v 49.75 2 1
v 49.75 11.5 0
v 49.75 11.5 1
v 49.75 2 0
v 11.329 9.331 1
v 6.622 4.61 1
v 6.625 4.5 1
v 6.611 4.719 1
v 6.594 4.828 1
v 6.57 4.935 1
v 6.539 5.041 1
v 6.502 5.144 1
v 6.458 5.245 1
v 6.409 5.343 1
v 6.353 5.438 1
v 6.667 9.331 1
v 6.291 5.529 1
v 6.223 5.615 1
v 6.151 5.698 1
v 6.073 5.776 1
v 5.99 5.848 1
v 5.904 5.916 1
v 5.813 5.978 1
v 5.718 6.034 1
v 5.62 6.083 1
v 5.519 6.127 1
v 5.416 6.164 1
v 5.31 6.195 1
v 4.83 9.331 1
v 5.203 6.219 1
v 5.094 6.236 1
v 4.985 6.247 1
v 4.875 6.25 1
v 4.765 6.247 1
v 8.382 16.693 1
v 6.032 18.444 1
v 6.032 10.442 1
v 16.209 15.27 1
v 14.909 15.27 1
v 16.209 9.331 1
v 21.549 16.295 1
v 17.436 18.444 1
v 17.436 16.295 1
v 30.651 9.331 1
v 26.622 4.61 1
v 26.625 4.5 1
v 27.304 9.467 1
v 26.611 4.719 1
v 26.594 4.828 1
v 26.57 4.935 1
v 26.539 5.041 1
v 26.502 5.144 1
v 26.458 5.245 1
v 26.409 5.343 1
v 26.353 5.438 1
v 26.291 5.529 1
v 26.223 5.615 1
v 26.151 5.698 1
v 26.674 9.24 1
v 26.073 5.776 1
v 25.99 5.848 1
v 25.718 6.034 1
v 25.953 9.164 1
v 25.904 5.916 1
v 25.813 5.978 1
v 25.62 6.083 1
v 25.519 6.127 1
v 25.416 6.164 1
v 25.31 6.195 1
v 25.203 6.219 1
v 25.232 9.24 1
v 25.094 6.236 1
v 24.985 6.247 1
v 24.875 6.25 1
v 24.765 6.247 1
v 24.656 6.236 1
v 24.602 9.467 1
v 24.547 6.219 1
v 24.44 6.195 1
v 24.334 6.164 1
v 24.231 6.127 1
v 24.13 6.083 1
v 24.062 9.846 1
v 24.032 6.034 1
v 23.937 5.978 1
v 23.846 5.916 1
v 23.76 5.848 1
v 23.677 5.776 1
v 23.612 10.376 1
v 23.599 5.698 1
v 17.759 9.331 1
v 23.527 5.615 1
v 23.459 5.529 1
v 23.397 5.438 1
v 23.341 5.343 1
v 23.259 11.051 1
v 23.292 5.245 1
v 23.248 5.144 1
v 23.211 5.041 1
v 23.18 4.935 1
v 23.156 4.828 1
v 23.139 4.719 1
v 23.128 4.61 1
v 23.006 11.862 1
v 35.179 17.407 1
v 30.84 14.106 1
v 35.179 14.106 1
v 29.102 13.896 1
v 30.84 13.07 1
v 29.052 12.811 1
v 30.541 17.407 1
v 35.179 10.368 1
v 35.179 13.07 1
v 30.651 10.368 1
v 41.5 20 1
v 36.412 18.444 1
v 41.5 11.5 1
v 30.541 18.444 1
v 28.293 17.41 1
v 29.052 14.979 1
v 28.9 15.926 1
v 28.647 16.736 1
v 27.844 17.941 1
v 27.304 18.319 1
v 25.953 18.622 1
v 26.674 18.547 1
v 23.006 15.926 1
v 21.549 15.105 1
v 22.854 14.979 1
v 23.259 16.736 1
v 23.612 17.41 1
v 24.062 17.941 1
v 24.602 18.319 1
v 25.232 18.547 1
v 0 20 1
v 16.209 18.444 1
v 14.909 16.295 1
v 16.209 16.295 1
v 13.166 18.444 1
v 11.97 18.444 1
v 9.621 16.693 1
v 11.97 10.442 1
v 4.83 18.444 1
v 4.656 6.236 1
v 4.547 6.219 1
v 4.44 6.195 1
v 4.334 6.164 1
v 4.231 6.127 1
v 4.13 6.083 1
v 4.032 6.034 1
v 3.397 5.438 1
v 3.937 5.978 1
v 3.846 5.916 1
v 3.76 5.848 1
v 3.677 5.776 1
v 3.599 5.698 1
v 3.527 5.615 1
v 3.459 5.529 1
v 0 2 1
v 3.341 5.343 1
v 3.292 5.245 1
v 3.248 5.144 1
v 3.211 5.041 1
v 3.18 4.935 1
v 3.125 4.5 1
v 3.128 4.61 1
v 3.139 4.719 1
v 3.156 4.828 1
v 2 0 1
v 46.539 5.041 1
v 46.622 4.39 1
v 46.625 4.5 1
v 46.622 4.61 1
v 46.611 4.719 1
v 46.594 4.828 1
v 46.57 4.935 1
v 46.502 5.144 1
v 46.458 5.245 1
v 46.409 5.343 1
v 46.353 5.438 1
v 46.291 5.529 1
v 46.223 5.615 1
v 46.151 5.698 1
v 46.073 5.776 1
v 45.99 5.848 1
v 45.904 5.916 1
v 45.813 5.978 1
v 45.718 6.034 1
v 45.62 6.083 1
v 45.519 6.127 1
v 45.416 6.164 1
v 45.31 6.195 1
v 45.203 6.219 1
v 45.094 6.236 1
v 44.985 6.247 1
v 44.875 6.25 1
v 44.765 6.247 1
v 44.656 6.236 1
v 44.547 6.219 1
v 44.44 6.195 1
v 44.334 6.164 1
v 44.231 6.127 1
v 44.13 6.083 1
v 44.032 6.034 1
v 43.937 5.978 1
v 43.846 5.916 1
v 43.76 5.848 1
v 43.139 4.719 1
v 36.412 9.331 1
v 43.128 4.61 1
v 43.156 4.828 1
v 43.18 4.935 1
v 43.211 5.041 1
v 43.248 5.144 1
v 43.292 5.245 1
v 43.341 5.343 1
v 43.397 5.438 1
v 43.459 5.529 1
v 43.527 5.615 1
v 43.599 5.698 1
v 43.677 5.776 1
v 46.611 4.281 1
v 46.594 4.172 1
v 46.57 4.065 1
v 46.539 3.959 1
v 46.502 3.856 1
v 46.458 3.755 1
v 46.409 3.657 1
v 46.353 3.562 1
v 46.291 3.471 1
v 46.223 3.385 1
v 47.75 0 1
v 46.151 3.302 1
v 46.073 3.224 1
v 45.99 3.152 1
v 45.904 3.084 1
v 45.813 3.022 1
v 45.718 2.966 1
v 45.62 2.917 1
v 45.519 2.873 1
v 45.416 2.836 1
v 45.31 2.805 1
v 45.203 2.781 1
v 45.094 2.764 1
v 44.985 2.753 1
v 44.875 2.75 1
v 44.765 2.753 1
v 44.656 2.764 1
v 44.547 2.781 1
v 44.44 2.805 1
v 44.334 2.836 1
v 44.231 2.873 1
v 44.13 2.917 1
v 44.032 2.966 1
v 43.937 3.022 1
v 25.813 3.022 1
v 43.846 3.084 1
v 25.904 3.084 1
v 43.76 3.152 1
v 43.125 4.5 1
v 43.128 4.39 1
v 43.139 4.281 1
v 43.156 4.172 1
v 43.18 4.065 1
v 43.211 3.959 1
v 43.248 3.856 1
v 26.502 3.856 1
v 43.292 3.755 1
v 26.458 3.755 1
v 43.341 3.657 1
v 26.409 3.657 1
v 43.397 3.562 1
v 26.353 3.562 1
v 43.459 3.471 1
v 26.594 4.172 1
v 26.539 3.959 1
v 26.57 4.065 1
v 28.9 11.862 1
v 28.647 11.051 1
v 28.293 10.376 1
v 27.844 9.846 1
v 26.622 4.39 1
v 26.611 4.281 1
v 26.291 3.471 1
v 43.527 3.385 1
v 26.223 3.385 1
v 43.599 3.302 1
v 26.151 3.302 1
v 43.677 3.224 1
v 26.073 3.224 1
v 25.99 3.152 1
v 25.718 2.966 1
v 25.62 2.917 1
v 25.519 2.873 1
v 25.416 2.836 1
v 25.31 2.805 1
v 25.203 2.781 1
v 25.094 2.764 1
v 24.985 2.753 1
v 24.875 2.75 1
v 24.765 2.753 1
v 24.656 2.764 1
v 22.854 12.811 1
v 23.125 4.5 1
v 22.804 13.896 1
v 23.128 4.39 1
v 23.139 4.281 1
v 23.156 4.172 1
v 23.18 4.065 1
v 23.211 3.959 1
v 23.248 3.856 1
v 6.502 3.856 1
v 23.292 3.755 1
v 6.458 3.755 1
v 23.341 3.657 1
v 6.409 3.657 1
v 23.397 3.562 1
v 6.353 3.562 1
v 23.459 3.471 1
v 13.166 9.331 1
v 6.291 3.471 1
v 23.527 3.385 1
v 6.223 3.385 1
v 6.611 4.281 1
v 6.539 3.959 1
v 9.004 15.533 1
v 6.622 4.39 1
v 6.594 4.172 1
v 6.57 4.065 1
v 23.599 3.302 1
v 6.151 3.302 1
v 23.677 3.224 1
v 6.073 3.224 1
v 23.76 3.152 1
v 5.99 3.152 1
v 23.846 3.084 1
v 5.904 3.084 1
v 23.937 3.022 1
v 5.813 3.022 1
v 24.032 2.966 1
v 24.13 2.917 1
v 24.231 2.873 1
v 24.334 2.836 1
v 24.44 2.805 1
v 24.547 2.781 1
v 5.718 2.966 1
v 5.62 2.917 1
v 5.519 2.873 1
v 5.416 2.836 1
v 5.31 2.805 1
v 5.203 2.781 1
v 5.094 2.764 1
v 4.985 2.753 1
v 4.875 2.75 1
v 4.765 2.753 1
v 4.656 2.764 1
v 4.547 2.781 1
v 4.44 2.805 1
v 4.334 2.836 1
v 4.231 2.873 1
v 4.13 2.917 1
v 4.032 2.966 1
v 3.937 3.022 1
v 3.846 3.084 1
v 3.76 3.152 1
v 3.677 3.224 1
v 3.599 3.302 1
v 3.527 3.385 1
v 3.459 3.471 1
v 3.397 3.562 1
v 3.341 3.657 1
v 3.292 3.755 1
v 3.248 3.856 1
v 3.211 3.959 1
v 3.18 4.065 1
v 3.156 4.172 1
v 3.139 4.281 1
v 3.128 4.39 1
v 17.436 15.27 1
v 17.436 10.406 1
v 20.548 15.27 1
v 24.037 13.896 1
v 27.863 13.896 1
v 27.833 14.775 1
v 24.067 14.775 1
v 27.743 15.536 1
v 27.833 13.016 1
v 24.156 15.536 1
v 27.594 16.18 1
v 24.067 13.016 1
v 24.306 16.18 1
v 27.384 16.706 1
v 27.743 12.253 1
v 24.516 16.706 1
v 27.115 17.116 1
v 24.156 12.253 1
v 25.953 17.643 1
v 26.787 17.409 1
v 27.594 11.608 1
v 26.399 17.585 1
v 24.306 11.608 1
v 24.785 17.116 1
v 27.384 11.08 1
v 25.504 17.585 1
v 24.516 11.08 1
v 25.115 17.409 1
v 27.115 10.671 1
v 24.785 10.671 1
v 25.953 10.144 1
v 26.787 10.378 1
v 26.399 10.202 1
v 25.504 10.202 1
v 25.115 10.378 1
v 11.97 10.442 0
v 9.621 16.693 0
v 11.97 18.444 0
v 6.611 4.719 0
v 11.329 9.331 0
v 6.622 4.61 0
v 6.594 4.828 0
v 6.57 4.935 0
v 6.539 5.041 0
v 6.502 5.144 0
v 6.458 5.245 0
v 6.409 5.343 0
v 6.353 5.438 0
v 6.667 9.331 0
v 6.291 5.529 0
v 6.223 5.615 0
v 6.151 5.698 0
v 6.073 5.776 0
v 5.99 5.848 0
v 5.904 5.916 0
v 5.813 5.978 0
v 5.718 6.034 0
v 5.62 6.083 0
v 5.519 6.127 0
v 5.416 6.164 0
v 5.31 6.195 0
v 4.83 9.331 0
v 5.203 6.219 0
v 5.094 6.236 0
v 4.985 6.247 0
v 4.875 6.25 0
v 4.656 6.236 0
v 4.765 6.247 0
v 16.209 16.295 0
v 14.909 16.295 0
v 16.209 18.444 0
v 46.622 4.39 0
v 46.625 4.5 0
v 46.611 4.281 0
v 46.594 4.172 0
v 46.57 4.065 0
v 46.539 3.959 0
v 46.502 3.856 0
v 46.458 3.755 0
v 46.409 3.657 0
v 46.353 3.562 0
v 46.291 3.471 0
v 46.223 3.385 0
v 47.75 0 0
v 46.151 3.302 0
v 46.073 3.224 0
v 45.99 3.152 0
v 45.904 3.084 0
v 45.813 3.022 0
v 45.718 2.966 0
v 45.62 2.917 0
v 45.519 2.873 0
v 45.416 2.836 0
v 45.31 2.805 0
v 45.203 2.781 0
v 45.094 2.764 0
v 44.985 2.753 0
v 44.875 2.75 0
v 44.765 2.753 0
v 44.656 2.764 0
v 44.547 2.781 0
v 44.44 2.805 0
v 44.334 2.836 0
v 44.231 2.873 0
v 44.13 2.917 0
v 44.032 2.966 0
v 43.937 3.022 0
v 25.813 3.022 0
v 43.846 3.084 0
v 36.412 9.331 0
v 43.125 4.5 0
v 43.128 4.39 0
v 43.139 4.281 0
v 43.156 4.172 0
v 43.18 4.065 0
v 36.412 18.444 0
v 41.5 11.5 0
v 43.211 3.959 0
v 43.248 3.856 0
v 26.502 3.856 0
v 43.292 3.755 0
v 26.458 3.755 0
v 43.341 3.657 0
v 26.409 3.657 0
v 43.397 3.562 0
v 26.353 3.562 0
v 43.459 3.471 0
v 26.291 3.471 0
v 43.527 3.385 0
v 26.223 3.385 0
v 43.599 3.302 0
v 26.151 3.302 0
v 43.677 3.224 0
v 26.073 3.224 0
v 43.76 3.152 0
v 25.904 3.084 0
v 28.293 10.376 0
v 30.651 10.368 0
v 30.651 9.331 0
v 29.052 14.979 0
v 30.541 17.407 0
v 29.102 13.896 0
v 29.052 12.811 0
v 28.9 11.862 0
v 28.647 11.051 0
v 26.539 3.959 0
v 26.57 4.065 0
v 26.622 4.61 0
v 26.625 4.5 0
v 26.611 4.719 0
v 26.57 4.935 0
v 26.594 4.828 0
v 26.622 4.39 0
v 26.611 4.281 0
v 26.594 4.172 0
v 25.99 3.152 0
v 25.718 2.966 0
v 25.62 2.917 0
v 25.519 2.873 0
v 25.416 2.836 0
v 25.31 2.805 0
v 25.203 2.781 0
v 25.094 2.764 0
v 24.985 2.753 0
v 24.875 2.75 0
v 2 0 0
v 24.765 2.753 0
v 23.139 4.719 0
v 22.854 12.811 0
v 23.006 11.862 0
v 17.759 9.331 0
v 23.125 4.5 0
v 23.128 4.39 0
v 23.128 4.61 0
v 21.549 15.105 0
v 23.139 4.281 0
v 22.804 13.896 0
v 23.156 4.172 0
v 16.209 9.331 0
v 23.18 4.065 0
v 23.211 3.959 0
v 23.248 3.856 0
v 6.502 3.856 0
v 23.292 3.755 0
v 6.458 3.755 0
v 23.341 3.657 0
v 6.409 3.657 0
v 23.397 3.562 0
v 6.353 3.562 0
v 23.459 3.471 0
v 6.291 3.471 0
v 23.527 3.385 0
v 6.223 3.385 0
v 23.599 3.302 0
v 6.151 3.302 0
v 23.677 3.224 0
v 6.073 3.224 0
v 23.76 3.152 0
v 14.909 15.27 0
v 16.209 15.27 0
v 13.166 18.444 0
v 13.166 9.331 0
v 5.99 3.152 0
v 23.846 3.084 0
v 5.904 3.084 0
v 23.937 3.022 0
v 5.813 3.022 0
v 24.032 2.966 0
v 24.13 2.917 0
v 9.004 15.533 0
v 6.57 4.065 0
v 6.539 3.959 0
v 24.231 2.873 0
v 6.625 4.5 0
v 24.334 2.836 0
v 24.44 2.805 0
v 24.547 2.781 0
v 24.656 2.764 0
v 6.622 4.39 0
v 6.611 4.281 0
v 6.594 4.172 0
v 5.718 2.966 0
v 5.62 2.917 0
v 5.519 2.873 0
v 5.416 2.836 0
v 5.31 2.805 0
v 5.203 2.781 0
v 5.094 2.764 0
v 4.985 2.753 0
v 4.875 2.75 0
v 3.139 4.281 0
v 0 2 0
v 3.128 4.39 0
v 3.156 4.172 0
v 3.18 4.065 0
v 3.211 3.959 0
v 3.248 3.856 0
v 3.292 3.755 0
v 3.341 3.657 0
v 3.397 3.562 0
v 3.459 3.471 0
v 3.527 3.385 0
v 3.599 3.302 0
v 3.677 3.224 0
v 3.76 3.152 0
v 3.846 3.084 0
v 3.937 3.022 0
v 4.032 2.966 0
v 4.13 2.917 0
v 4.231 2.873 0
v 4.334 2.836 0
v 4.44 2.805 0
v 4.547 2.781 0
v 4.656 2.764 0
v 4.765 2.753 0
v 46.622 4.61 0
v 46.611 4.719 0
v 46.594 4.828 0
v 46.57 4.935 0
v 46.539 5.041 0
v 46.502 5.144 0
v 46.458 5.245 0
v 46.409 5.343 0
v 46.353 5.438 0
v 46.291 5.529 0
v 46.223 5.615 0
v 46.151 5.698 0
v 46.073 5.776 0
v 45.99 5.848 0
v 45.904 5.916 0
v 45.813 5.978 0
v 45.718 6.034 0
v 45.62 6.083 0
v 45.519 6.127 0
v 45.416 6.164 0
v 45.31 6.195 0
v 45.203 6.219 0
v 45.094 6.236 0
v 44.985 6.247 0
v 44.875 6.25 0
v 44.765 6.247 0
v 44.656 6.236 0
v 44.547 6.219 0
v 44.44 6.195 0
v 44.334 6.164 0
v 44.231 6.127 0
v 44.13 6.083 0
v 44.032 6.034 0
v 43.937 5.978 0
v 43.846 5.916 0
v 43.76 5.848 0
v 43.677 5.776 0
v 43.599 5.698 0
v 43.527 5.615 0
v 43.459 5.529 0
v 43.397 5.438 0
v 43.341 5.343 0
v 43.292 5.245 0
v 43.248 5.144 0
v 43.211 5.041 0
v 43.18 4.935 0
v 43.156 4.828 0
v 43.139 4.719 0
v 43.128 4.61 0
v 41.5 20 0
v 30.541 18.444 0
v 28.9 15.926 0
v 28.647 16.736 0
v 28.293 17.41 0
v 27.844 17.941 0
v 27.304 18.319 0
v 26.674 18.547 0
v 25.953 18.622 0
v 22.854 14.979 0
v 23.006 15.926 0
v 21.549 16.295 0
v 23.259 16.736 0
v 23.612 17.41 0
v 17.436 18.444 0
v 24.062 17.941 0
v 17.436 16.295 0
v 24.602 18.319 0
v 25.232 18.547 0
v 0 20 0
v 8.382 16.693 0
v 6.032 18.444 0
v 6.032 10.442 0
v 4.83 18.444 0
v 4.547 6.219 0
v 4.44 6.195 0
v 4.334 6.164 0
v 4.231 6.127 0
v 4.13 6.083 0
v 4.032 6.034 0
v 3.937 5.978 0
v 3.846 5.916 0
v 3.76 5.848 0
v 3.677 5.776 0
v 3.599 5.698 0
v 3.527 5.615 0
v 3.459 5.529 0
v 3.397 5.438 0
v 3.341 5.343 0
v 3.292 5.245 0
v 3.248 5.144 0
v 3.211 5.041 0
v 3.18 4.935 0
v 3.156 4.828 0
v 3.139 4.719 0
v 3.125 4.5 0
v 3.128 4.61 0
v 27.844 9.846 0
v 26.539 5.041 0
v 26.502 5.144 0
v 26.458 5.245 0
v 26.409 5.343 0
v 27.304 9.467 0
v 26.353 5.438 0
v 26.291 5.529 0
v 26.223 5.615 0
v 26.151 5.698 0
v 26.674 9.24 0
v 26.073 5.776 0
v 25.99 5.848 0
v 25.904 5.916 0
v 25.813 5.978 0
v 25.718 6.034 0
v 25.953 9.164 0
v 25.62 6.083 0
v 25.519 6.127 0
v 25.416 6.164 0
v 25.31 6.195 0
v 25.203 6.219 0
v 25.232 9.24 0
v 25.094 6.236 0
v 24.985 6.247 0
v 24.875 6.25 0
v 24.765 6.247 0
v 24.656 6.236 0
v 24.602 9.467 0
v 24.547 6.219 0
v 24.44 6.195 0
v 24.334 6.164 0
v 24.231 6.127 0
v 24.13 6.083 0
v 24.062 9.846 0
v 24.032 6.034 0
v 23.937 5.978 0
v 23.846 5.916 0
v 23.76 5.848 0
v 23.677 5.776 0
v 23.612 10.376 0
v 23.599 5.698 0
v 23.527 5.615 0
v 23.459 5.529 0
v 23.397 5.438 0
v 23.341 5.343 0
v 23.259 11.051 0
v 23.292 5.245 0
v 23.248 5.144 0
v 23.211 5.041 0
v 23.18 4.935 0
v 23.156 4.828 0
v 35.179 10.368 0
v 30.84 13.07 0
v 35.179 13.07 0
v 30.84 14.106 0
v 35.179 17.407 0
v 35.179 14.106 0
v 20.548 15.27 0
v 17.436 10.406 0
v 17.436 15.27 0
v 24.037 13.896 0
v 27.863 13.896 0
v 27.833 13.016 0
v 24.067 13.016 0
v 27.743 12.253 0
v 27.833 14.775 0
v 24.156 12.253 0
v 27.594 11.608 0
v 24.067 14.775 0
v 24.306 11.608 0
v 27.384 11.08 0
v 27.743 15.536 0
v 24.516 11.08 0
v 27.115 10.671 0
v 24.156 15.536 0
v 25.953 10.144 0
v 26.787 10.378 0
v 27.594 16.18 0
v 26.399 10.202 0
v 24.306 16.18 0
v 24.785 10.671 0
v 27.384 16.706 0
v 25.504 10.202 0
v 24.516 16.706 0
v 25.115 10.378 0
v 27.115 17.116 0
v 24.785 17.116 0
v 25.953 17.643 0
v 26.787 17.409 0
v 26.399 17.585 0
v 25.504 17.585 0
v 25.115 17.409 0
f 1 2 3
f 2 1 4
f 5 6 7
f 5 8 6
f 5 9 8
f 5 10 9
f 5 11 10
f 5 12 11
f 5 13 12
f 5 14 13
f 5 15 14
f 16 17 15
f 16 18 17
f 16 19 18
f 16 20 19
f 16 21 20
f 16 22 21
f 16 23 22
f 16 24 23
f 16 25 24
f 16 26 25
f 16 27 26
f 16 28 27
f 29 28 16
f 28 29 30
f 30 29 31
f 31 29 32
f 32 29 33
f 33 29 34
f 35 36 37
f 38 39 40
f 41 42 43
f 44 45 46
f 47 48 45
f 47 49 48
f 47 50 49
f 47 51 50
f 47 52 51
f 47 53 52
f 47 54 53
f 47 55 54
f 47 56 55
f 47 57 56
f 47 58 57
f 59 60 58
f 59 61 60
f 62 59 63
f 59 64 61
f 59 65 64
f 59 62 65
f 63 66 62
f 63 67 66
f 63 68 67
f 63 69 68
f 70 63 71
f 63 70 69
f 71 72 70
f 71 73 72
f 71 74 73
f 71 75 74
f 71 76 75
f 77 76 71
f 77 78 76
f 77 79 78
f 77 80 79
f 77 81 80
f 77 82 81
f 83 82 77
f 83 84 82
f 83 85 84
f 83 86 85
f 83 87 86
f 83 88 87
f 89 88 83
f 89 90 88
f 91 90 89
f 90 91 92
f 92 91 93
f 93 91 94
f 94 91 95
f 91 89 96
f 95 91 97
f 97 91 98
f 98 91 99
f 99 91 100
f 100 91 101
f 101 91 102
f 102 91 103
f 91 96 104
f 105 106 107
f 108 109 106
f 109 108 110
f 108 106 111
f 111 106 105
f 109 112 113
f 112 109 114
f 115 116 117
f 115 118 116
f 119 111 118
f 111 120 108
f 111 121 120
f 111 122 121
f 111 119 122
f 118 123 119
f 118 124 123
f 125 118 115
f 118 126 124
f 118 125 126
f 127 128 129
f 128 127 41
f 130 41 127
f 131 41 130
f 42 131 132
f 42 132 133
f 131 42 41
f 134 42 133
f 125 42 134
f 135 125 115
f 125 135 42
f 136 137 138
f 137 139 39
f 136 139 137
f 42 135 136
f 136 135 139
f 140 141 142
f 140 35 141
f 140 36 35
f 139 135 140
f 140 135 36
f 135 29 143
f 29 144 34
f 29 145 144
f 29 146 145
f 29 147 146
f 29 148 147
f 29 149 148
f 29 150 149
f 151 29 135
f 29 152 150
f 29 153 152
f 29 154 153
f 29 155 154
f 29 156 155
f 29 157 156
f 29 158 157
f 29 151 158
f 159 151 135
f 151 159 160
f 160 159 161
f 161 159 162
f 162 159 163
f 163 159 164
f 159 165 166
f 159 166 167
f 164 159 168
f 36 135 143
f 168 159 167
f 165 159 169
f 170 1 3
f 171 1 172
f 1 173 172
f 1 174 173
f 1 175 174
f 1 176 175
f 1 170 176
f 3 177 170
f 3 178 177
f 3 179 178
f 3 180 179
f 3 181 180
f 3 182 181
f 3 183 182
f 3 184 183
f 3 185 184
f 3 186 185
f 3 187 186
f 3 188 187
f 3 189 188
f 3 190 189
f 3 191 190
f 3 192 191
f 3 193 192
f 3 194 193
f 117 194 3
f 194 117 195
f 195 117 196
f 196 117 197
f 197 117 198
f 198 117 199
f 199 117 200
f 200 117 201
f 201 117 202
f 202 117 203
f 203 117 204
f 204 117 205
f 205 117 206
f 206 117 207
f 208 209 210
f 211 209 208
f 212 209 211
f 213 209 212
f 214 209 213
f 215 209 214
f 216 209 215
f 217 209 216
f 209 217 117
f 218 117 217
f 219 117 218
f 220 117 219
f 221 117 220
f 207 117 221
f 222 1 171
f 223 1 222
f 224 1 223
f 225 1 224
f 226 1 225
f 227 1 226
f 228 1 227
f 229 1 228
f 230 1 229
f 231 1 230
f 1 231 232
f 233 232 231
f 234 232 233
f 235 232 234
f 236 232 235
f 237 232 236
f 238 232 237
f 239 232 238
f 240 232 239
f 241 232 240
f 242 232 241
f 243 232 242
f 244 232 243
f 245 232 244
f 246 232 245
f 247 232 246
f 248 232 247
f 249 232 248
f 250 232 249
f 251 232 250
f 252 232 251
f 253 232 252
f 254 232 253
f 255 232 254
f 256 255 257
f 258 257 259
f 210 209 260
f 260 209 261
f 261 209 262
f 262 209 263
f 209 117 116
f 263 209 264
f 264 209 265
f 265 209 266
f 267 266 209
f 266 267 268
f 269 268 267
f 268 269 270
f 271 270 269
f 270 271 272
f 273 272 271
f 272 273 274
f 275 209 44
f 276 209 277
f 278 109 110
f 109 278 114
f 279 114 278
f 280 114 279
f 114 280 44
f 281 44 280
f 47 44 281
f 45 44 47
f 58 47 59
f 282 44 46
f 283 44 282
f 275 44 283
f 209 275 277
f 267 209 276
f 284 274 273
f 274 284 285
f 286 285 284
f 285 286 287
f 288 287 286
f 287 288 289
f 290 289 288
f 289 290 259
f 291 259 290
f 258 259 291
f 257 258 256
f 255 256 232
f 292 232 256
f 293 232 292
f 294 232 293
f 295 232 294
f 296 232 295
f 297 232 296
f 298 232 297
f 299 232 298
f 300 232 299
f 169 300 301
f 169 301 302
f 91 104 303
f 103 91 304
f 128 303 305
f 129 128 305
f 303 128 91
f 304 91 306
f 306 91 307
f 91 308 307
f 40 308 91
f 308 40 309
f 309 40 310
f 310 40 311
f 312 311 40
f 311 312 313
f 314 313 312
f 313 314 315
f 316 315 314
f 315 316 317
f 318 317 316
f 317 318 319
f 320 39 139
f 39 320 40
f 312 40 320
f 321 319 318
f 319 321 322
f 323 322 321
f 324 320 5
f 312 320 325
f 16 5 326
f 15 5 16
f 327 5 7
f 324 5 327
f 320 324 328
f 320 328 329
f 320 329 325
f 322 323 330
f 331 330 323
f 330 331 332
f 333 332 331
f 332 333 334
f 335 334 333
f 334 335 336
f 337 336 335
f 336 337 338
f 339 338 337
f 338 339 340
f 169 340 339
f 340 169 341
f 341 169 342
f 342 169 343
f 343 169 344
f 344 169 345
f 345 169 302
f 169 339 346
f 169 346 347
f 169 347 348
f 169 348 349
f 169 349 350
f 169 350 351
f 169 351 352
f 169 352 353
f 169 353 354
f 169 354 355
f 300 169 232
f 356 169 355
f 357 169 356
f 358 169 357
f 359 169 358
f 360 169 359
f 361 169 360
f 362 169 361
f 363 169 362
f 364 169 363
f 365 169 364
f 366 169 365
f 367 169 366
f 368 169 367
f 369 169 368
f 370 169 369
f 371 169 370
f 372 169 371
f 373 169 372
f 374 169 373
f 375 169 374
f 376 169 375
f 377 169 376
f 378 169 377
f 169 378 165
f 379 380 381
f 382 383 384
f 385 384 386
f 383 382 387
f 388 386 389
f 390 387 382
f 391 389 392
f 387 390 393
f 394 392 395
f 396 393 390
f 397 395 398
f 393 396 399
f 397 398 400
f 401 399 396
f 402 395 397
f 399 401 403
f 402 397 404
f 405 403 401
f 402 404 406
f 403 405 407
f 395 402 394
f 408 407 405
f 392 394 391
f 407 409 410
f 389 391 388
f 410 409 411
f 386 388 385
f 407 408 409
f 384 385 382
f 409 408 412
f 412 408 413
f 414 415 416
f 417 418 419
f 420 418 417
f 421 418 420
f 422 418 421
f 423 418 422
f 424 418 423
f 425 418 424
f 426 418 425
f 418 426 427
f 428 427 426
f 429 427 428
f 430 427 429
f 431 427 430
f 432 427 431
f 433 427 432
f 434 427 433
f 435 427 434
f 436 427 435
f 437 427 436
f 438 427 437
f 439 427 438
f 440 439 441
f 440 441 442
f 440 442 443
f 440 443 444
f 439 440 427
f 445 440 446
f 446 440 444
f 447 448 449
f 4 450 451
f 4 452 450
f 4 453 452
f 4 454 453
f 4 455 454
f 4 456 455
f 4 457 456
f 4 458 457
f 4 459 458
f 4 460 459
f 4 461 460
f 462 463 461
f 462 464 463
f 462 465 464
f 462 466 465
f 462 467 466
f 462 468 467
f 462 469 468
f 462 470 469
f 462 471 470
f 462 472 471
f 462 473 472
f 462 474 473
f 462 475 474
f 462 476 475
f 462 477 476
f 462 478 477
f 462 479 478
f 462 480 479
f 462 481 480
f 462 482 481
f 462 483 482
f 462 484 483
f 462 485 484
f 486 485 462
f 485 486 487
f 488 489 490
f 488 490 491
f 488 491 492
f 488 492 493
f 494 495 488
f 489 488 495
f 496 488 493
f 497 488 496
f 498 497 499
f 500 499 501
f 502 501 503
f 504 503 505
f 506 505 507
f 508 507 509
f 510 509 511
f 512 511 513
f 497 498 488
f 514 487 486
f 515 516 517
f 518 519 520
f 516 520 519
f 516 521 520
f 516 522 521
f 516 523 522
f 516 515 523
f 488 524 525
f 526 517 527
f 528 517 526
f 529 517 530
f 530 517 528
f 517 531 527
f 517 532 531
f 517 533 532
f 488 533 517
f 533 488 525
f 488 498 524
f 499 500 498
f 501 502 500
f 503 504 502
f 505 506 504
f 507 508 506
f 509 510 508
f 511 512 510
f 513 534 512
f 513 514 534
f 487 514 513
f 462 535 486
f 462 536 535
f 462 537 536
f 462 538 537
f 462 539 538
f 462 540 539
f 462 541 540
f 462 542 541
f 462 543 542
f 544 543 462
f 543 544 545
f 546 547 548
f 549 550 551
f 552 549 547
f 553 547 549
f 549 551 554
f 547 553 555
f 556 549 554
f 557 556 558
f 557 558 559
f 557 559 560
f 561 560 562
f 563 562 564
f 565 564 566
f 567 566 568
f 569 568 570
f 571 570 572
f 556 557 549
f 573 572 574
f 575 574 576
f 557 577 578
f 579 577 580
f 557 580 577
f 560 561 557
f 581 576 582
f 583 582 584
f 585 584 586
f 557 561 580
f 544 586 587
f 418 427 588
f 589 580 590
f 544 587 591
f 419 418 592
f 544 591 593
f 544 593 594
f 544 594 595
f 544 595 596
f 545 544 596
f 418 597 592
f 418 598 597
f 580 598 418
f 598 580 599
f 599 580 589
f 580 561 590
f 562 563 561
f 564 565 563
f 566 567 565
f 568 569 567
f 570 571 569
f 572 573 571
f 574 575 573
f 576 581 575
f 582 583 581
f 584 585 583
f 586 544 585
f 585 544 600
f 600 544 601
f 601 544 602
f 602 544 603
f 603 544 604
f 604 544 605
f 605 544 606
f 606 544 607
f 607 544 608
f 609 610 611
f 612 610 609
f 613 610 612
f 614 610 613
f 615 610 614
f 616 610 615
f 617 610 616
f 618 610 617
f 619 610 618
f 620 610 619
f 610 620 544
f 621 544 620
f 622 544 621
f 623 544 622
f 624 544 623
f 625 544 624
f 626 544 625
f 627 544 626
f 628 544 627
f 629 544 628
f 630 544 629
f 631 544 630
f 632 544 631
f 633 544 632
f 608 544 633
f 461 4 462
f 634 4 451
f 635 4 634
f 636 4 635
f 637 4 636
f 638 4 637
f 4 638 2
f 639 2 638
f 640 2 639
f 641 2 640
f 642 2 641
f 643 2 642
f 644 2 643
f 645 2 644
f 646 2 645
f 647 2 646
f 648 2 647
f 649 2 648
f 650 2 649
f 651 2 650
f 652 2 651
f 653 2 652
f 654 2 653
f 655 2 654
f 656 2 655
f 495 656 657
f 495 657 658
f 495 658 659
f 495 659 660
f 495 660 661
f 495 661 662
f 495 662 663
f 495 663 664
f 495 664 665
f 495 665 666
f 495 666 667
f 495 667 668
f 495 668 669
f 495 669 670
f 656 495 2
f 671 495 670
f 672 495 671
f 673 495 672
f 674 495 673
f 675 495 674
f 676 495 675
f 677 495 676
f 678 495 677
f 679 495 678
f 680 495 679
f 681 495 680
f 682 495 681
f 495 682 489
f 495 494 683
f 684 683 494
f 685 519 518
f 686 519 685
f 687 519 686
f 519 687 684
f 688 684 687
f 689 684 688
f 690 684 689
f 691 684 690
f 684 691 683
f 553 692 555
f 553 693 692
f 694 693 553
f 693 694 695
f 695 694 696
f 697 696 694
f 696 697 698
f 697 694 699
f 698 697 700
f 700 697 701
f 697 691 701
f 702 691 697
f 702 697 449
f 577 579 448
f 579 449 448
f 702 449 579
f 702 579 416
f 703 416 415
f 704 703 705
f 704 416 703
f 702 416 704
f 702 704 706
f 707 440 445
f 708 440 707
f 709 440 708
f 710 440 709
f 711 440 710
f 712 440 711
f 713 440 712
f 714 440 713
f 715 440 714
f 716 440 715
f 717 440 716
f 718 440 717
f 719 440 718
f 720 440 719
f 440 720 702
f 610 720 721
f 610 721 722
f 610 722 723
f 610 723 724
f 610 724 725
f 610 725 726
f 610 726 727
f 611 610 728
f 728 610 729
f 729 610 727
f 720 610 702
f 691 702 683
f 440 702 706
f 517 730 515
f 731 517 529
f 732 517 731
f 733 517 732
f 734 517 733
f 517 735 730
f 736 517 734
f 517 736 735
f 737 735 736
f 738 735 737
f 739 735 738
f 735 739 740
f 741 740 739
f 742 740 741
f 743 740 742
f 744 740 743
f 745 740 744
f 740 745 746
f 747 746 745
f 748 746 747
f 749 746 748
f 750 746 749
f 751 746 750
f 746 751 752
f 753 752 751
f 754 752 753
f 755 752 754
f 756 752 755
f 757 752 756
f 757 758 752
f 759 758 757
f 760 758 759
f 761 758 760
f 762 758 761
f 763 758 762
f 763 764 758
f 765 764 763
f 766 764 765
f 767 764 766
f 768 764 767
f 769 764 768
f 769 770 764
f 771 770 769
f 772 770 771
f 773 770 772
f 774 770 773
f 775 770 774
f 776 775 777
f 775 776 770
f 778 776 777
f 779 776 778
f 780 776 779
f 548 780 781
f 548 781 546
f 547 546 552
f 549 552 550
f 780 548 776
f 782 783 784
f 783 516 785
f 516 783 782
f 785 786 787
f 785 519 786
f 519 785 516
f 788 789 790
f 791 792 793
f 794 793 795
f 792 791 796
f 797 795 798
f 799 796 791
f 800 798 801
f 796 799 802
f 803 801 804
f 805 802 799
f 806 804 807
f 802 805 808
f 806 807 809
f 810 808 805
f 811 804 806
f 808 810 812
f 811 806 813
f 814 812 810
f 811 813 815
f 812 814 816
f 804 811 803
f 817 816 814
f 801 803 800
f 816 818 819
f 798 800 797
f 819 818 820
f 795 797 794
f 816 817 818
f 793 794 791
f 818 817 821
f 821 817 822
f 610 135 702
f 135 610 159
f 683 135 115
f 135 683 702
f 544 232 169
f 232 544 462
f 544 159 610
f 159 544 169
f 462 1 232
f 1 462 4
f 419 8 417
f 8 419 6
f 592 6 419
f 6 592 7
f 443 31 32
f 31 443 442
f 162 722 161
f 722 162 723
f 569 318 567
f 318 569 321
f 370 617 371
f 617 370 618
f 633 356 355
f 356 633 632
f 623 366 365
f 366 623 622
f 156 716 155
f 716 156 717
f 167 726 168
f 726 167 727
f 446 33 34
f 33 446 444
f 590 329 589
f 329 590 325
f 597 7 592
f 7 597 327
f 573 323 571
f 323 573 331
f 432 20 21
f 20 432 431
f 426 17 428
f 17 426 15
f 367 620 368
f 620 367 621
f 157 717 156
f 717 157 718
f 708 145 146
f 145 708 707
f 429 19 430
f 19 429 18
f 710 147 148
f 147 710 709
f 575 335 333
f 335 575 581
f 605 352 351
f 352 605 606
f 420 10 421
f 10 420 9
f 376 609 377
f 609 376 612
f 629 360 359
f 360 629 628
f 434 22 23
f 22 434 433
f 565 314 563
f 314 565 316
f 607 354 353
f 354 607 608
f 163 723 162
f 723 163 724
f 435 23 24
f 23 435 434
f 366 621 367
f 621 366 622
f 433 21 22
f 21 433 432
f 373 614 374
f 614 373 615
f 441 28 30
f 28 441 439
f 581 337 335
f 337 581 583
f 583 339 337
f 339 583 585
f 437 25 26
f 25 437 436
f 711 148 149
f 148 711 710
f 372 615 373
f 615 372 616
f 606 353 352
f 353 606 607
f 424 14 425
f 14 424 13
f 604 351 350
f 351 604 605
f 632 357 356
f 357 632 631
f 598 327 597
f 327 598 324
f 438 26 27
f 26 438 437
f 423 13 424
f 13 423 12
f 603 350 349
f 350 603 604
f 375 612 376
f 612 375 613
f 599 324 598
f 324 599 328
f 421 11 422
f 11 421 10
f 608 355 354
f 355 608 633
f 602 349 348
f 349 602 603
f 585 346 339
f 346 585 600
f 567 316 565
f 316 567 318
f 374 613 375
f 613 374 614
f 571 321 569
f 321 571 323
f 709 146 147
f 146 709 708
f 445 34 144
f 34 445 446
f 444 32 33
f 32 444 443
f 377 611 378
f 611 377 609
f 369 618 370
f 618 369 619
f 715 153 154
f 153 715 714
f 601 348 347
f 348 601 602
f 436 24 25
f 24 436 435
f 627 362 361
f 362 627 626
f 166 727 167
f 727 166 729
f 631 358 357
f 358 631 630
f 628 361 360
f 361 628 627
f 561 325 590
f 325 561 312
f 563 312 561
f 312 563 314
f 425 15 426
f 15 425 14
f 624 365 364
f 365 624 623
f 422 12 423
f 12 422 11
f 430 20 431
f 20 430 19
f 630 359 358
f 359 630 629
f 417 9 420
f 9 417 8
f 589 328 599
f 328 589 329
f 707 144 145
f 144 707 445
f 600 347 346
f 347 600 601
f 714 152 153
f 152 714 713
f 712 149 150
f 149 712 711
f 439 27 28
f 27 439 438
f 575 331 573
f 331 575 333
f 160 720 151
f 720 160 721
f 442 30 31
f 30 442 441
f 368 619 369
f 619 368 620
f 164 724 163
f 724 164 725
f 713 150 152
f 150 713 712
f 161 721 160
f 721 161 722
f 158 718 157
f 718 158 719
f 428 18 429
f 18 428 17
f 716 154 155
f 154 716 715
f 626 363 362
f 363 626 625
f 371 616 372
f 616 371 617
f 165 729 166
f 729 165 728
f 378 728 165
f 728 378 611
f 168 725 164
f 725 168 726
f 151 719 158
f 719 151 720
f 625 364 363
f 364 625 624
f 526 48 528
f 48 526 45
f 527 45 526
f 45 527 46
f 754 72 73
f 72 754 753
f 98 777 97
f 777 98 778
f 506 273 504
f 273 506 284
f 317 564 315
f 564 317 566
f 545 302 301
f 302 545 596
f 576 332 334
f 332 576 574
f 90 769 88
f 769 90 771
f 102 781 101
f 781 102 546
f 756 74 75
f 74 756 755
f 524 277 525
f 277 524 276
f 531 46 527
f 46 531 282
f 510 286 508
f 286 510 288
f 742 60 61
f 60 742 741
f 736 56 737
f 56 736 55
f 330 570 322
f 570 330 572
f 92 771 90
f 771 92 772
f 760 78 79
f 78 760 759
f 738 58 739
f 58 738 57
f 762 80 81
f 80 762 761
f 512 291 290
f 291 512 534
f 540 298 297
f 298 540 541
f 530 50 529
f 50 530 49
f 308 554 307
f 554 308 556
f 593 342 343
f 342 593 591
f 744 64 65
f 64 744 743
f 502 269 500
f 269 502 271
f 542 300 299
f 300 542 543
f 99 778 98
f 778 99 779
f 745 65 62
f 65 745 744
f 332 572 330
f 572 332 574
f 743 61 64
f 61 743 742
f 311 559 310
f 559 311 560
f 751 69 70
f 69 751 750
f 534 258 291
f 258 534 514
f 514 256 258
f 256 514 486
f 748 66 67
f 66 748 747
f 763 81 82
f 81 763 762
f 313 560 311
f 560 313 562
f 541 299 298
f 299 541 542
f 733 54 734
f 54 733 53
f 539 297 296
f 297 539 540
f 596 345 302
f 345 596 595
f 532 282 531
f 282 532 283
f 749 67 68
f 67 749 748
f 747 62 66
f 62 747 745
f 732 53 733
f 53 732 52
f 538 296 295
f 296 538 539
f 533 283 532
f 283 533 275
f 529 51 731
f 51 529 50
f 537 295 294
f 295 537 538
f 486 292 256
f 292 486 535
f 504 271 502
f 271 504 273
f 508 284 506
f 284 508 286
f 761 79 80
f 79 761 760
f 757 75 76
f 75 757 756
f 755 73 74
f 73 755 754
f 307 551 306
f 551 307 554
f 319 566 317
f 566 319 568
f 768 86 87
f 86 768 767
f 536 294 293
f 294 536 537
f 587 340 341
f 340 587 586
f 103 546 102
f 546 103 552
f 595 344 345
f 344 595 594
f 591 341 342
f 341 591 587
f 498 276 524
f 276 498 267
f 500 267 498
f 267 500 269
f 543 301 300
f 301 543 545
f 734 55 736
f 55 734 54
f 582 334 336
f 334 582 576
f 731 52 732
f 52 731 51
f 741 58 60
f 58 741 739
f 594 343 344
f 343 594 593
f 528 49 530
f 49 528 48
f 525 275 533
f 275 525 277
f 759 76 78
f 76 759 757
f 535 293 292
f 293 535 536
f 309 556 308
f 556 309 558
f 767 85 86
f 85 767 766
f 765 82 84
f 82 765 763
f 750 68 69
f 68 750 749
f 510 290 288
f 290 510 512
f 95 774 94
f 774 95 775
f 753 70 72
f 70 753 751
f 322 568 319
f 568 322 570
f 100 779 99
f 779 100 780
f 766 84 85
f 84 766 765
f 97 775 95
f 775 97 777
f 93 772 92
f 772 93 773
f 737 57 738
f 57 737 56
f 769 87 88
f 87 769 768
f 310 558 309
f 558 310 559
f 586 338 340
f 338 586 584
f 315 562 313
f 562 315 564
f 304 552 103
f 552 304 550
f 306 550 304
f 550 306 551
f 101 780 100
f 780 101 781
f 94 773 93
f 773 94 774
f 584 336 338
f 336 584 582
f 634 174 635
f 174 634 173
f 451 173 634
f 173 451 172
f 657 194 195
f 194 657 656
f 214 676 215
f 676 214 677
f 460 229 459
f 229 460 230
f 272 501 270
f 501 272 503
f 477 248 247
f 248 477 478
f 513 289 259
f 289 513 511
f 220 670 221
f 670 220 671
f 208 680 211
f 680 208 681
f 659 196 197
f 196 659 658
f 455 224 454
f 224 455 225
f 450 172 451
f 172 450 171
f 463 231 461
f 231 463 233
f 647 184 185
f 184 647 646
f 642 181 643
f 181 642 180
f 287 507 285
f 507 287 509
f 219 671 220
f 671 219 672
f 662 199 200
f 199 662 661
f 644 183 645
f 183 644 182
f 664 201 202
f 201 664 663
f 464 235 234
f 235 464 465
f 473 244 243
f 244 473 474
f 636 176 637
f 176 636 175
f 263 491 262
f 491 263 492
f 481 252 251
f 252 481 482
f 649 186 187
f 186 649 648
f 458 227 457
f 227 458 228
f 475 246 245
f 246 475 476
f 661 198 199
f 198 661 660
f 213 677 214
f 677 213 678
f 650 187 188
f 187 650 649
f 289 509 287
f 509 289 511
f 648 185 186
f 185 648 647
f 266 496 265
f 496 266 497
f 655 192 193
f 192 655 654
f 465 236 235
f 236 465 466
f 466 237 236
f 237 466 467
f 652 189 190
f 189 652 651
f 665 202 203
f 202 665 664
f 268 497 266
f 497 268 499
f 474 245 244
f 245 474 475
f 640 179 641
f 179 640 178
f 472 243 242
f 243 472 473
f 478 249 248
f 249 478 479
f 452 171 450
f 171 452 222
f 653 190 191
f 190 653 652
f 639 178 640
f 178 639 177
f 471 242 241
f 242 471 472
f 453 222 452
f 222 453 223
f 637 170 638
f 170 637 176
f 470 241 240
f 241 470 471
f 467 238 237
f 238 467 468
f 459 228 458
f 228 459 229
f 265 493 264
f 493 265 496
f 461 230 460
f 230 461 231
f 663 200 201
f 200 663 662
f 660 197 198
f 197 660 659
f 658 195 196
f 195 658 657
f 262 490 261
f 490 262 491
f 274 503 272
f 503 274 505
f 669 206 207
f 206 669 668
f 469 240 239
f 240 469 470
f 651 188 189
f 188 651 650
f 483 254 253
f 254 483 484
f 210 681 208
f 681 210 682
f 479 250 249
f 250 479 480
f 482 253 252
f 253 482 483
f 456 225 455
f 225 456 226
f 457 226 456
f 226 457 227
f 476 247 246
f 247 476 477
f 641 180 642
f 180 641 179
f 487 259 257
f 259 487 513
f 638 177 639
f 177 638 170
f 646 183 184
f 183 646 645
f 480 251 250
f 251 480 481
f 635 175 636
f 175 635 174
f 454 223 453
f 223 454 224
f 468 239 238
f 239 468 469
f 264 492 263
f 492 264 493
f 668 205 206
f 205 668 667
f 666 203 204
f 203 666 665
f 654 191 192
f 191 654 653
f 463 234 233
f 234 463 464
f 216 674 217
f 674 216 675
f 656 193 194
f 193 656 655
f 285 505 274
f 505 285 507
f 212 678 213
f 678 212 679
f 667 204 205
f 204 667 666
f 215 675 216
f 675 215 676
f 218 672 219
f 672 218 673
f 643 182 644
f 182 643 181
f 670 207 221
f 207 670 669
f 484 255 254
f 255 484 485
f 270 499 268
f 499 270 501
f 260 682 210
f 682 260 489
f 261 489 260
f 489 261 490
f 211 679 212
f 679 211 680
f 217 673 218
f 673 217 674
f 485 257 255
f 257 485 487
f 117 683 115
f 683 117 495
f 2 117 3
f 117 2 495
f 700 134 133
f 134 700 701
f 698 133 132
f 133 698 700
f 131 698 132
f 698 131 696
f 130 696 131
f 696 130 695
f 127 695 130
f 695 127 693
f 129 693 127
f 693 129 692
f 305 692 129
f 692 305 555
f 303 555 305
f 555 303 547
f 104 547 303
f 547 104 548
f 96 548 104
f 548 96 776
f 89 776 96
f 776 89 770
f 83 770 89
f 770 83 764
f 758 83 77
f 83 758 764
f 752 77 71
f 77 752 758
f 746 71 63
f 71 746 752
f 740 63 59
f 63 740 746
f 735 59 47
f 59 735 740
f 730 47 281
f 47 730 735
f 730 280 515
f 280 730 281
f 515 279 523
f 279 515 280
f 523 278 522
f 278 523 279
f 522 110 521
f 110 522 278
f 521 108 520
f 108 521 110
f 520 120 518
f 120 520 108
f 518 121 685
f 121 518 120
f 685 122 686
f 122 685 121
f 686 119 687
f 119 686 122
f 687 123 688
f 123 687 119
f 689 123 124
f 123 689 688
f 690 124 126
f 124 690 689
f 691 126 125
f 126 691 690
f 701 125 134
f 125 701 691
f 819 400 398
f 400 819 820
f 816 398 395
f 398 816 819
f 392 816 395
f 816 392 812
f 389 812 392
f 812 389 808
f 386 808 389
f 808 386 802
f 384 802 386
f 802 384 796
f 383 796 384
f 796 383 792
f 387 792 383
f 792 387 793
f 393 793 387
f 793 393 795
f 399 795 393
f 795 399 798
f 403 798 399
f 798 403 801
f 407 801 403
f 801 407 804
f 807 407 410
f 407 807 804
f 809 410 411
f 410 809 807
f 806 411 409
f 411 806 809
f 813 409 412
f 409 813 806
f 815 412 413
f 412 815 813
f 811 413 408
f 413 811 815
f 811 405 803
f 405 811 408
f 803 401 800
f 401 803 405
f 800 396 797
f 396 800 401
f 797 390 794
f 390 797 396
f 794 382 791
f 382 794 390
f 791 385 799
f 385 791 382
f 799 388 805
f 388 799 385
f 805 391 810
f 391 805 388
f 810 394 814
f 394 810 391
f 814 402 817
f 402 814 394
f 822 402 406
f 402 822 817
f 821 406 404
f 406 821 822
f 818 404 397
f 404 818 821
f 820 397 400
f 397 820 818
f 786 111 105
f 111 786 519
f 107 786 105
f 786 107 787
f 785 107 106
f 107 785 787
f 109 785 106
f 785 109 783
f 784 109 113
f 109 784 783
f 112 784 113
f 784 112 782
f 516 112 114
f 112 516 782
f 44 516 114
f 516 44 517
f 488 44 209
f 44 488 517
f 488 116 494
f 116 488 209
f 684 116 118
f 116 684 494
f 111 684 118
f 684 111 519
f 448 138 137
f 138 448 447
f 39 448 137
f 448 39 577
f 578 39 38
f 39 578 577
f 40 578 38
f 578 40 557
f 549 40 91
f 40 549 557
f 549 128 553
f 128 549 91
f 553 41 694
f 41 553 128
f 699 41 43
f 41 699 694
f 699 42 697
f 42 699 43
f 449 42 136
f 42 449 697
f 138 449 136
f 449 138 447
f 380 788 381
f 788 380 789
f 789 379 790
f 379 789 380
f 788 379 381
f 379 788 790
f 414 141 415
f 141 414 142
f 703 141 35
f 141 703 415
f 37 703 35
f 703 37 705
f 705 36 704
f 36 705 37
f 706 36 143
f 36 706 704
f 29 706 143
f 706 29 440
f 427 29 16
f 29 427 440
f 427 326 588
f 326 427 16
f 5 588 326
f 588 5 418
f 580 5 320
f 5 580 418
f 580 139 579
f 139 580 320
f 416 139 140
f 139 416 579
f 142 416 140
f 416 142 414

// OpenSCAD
/*[Nameplate Settings]*/
//in mm
thickness=1; //[0.1:5]
//text to appear on nameplate
nameplatetext="E04M";
//check if text is raised or sunken
raised = false;

module nameplate() {
  totalwidth=49.75;
  indentpos=41.5;
  totalheight=20;
  holeradius=1.75;

  //font = "DIN Schablonierschrift";
  font = raised ? "Arial" : "Allerta Stencil";

  difference() {
    cube(size=[totalwidth, totalheight, thickness]);
    
    rotate([0,0,45]) 
      cube(size=[2.828, 2.828, thickness*3], center=true);
    
    translate([totalwidth,0,0]) 
      rotate([0,0,45]) 
      cube(size=[2.828, 2.828, thickness*3], center=true);

    translate([4.875, 4.5, 0]) 
      cylinder(r=holeradius, thickness*3, center=true, $fn=100);
    
    translate([24.875, 4.5, 0]) 
      cylinder(r=holeradius, thickness*3, center=true, $fn=100);
    
    translate([44.875, 4.5, 0]) 
      cylinder(r=holeradius, thickness*3, center=true, $fn=100);
    
    translate([indentpos, 11.5, -thickness/2]) cube([20, 20, thickness*2]);

    if (!raised) {
      translate([indentpos/2, 14, -thickness/2])
        rotate([0,0,180])
        linear_extrude(height = thickness*2) {
           text(
             nameplatetext, 
             font = font, size = 9, valign="center", halign="center"
           );
        }
     }
  }


  if (raised) {
    translate([indentpos/2, 14, 0])
    rotate([0,0,180])
    linear_extrude(height = thickness*2) {
       text(
         nameplatetext, 
         font = font, size = 9, valign="center", halign="center"
       );
    }
  }
}

nameplate();
